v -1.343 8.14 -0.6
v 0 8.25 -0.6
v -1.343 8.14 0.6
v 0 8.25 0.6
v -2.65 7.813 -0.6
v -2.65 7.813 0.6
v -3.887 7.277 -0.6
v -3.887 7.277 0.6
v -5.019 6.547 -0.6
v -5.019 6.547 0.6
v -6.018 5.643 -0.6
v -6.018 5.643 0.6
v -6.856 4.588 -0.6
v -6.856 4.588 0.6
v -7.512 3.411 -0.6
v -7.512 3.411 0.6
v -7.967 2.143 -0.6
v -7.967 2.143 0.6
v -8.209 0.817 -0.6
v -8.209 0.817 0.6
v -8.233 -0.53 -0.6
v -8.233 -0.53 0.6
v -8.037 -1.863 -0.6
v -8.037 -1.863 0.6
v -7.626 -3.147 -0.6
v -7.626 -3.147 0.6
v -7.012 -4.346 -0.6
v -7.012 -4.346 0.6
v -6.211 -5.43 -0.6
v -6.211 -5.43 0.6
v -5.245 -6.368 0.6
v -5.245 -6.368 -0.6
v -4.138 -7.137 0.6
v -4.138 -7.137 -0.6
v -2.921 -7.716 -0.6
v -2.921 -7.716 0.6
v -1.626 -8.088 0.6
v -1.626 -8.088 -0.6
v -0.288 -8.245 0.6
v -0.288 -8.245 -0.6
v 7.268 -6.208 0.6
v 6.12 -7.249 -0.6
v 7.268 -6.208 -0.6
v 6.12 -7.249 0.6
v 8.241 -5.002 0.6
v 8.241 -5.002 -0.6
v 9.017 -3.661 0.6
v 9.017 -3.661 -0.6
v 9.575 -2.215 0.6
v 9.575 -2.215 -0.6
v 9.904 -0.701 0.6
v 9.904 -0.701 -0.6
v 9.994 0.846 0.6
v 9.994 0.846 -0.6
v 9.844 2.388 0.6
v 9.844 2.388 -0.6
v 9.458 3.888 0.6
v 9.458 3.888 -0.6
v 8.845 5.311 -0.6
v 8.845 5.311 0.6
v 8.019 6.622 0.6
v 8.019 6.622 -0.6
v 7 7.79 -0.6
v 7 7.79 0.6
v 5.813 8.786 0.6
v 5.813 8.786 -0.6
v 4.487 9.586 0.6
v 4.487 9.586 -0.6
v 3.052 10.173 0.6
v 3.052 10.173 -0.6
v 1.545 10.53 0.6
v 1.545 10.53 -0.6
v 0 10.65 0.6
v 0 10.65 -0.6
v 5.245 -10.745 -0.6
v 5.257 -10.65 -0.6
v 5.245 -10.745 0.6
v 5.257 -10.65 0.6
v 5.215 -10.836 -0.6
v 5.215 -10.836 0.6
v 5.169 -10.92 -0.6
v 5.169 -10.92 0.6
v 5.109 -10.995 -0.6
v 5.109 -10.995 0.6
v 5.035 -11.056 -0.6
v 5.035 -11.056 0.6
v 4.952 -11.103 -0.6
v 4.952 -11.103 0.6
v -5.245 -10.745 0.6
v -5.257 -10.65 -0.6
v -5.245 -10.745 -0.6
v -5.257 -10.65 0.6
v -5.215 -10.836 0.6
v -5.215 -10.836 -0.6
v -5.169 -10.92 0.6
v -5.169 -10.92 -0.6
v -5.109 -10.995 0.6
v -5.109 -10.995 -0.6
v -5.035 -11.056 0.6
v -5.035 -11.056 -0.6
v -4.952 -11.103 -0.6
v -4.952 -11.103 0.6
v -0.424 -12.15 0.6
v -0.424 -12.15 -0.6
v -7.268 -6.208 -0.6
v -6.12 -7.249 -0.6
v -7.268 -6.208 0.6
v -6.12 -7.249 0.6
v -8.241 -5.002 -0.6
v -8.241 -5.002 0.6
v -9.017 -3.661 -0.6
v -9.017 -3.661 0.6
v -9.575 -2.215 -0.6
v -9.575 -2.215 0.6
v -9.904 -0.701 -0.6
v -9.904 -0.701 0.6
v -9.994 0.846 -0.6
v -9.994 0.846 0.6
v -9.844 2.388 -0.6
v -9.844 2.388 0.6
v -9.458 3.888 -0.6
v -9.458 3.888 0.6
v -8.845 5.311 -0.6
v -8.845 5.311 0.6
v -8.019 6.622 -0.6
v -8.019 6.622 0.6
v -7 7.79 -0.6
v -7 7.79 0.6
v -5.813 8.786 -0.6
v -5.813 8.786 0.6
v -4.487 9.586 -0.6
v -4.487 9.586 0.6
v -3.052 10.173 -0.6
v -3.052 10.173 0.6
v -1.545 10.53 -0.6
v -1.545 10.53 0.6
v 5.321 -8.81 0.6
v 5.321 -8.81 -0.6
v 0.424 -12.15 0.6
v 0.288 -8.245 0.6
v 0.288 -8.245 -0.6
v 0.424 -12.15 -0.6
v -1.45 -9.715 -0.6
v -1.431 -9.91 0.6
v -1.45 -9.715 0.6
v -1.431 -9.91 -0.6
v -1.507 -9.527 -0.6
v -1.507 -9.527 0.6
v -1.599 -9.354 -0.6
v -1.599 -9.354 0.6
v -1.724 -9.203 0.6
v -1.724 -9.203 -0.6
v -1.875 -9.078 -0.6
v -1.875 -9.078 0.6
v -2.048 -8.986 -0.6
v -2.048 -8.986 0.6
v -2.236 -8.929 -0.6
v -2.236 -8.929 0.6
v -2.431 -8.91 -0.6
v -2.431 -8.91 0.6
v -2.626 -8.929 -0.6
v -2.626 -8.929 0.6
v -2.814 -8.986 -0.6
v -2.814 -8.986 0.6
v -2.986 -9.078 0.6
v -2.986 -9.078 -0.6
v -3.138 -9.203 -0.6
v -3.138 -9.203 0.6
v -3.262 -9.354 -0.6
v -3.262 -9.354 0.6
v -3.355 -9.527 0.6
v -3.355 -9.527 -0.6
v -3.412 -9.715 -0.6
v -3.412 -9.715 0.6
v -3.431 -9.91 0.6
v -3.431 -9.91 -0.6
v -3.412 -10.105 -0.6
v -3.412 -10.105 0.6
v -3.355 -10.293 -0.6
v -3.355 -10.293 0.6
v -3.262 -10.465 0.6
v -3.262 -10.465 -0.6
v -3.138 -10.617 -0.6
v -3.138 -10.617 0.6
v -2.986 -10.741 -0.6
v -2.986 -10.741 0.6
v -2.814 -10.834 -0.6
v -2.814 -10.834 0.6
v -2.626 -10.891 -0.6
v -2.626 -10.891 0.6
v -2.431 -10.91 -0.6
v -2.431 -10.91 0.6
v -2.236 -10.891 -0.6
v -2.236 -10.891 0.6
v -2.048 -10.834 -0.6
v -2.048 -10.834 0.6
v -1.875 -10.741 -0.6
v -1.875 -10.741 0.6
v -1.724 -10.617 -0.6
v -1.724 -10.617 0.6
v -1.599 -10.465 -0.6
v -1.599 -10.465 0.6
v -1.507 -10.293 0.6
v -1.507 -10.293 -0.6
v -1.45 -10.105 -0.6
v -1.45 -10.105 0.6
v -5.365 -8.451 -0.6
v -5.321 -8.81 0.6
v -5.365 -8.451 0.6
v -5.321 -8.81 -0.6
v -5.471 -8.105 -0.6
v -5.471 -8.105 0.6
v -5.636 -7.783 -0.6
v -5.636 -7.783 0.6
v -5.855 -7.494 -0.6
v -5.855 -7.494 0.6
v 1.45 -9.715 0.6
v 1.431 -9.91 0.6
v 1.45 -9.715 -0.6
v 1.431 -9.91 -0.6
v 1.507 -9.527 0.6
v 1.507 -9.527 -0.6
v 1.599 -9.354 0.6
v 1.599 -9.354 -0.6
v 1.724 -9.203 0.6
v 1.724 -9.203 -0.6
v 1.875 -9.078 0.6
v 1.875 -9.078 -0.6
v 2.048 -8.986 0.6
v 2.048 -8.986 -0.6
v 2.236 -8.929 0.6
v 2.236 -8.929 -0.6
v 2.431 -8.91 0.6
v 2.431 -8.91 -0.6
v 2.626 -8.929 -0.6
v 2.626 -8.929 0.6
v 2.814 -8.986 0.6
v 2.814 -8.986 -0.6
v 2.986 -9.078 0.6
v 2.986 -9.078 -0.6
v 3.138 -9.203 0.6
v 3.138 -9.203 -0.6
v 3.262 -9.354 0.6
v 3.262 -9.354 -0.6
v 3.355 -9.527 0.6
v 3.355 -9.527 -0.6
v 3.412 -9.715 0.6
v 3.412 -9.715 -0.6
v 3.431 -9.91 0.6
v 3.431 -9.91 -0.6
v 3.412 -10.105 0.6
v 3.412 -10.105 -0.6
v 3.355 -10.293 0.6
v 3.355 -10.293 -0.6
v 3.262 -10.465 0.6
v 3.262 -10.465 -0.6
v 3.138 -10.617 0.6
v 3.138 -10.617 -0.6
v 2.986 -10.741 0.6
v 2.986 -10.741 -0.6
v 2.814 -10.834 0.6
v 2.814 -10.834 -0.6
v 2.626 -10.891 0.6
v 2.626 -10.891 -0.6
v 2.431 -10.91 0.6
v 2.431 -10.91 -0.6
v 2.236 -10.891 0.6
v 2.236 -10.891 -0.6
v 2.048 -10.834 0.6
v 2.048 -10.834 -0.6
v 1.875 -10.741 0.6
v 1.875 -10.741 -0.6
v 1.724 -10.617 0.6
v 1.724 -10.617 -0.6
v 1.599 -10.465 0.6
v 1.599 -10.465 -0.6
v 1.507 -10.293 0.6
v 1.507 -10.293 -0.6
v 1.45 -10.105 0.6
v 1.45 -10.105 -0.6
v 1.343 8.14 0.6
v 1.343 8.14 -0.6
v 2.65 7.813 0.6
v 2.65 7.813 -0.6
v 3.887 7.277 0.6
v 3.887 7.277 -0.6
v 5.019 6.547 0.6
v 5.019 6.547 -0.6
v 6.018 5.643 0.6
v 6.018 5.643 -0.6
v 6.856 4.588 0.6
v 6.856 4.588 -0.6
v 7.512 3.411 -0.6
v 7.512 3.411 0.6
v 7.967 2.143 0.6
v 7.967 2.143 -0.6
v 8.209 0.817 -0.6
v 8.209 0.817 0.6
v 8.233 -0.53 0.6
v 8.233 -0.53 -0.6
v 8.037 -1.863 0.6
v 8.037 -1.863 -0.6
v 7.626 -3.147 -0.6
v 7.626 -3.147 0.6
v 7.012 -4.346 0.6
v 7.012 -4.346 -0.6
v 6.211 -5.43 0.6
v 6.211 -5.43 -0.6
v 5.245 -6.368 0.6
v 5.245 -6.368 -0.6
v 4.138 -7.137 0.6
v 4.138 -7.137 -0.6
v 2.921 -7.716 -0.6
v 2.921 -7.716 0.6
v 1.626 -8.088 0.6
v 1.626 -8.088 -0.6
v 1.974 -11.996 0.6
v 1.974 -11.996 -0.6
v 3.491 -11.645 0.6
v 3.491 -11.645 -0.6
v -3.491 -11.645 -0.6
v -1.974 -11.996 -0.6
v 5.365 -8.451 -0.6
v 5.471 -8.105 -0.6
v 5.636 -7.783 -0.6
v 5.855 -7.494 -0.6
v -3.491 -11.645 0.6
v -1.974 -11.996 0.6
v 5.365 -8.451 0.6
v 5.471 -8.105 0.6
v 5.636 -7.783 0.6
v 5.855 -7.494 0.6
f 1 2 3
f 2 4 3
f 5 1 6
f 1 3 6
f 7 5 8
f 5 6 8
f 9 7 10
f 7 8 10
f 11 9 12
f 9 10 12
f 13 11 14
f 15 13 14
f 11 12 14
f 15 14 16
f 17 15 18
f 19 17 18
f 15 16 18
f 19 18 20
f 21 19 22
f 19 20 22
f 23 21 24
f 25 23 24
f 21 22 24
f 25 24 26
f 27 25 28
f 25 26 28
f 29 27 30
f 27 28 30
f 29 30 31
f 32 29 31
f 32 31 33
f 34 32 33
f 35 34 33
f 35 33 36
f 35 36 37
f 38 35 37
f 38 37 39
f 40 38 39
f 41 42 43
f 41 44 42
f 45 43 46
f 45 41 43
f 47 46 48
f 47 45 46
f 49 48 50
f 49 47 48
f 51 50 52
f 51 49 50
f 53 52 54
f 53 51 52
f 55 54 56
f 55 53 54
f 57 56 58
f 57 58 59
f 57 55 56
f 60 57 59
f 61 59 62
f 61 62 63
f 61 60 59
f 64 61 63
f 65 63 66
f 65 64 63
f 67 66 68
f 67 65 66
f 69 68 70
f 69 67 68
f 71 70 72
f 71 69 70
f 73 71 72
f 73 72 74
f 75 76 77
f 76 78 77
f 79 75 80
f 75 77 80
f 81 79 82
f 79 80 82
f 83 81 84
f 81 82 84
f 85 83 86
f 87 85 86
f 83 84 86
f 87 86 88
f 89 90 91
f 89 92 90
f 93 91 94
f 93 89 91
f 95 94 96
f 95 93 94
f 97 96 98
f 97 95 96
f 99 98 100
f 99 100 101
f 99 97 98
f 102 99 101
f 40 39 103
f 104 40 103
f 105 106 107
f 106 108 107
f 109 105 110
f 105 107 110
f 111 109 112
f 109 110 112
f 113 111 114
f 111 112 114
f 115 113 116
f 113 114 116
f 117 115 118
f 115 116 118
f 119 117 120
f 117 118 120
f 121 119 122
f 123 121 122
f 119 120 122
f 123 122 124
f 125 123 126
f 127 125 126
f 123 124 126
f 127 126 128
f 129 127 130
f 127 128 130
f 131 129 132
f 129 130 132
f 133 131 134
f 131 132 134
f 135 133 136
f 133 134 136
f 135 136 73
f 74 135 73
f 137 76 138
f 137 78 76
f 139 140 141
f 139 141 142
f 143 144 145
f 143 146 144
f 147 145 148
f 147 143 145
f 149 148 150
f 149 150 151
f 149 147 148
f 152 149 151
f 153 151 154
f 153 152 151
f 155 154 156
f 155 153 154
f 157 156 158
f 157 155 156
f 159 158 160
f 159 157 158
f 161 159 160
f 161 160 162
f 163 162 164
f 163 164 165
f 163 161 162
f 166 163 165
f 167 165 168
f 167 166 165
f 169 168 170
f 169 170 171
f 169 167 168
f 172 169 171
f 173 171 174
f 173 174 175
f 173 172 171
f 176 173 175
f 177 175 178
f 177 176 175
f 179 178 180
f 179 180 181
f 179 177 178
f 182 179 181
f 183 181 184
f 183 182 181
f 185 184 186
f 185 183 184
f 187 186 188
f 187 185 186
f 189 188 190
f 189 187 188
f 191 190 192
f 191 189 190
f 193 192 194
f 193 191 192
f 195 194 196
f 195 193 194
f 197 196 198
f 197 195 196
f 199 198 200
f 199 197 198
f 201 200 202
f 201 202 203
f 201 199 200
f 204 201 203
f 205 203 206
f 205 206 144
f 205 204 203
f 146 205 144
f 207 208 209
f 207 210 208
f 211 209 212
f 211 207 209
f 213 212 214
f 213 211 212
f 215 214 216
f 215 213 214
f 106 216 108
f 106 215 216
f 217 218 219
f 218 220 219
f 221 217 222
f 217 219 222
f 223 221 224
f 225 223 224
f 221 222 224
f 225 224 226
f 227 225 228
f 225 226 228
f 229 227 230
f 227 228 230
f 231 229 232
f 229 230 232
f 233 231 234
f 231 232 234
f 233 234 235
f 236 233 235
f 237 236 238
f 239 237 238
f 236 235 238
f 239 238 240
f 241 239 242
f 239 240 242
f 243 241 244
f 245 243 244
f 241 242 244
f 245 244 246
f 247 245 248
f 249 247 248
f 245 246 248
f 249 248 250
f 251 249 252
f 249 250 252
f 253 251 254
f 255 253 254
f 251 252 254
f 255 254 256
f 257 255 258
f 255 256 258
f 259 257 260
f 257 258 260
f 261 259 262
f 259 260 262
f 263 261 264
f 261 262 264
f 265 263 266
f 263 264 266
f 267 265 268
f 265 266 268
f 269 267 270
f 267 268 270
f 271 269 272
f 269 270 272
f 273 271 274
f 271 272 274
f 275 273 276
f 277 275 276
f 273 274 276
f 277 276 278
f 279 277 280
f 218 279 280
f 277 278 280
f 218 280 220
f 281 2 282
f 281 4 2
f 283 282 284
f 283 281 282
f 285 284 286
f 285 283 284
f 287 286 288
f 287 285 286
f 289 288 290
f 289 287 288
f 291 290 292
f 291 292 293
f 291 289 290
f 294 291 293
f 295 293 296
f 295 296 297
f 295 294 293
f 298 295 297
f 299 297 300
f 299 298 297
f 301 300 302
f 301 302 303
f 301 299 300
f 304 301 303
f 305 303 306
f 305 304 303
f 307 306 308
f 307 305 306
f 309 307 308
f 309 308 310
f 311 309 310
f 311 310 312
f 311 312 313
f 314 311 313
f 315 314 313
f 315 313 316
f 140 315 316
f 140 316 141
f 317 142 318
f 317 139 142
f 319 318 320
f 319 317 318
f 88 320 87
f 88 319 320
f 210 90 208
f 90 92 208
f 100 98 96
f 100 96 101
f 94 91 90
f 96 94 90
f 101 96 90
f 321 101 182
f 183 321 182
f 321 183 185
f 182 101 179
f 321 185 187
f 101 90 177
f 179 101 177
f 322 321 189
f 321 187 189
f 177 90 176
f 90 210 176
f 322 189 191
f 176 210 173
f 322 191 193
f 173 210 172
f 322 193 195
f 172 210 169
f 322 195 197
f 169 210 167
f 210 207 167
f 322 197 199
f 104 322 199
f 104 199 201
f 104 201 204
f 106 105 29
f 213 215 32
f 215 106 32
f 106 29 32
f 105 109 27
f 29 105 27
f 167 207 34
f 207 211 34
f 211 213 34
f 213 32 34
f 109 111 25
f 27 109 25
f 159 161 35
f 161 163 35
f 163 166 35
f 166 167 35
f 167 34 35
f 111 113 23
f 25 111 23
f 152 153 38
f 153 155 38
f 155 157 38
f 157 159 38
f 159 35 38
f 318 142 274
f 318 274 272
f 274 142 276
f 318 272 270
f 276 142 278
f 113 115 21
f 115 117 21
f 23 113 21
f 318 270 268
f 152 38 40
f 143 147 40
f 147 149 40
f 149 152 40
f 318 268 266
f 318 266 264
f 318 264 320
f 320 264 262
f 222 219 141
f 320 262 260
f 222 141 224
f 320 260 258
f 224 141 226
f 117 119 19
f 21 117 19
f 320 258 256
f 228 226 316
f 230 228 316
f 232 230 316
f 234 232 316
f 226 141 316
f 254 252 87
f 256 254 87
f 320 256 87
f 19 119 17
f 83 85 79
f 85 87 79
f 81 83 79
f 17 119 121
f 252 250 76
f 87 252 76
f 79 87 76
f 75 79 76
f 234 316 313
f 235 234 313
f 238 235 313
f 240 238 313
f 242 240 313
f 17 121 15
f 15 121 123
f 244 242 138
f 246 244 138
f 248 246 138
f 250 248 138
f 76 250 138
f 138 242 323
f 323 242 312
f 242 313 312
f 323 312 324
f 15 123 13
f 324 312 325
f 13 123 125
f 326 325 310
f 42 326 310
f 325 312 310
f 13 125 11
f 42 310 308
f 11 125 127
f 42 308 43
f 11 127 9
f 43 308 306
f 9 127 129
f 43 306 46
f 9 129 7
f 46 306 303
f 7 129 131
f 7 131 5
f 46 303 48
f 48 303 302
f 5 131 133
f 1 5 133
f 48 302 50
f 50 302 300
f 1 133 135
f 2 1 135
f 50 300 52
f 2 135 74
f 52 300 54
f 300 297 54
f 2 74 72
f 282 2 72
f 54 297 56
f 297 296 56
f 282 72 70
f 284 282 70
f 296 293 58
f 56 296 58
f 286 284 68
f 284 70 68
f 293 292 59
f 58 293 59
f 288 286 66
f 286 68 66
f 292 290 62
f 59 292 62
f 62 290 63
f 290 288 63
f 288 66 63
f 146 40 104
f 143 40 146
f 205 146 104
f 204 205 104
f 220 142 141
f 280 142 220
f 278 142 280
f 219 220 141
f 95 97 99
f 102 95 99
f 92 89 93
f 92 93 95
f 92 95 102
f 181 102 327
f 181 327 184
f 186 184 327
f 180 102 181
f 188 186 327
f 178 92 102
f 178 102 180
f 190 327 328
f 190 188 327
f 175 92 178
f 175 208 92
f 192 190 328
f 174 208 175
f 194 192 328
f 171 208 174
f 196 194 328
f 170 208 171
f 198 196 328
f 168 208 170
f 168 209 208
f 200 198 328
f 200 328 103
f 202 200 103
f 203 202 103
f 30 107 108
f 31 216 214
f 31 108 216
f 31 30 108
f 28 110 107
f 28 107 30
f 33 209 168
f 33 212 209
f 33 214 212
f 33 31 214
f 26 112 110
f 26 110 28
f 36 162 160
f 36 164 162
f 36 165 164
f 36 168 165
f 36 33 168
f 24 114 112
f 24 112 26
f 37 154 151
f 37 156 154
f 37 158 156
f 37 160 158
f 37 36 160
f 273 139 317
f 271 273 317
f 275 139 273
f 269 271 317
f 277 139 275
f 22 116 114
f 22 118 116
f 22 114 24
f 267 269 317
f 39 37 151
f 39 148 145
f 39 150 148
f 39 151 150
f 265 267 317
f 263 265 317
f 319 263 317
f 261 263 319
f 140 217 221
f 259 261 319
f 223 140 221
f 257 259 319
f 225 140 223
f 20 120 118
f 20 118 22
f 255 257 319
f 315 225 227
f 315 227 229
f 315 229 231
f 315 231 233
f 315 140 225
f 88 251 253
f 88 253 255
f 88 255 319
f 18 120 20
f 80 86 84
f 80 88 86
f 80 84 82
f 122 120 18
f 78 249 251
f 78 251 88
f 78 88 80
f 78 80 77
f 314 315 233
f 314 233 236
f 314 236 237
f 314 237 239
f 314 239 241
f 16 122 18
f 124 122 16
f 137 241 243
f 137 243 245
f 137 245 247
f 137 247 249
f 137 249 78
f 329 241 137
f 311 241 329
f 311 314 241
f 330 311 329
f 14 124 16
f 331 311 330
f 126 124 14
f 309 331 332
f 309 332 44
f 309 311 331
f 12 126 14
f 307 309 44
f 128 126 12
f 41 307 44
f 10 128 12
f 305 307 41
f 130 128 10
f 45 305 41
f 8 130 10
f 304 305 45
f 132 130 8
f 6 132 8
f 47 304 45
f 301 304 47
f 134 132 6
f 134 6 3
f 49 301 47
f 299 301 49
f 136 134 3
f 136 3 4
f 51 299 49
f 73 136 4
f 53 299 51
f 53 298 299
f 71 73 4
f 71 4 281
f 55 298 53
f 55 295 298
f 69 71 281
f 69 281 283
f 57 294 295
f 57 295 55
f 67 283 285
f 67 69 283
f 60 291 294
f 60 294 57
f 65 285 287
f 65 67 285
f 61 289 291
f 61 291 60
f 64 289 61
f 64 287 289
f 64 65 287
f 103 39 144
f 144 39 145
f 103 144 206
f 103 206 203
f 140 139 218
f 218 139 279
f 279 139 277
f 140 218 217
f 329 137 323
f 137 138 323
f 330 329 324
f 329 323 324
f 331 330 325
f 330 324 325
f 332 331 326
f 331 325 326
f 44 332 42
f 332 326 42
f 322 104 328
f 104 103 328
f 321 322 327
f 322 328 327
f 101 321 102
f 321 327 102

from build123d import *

# Parameters (mm, degrees)
SKETCH4_R           = 1
BOSS_EXTRUDE1_DEPTH = 0.6
FILLET1_R           = 2.065056386
FILLET2_R           = 0.516264097


with BuildPart() as part:
    # Sketch4 → Boss-Extrude1 (new, symmetric)
    with BuildSketch(Plane.XY):
        with BuildLine():
            Line((-5.246180053, -10.967229122), (-5.356700553, -7.785130647))
            ThreePointArc((-5.356700553, -7.785130647), (-9.598805691, 3.443313149), (0, 10.65))
            Line((0, 10.65), (0, 8.25))
            ThreePointArc((0, 8.25), (-8.248743485, 0.143982353), (-0.287920848, -8.244974323))
            Line((-0.287920848, -8.244974323), (-0.424287349, -12.15))
            ThreePointArc((-0.424287349, -12.15), (-2.896253939, -11.807380441), (-5.246180053, -10.967229122))
        make_face()
        with Locations((-2.430824062, -9.909926787)):
            Circle(SKETCH4_R, mode=Mode.SUBTRACT)
    extrude(amount=BOSS_EXTRUDE1_DEPTH, both=True)

    # Fillet1
    fillet1_edges = [part.edges().sort_by_distance(p)[0] for p in [
        (-5.356700553, -7.785130647, 0),
    ]]
    fillet(fillet1_edges, radius=FILLET1_R)

    # Fillet2
    fillet2_edges = [part.edges().sort_by_distance(p)[0] for p in [
        (-5.246180053, -10.967229122, 0),
    ]]
    fillet(fillet2_edges, radius=FILLET2_R)

    # Mirror1: part across plane


with BuildPart() as part_1:
    add(part.part)
    add(part.part.mirror(Plane(origin=(0, 10.65, 0.6), x_dir=(0, 0, 1), z_dir=(-1, 0, 0))))


solid = part_1.part
